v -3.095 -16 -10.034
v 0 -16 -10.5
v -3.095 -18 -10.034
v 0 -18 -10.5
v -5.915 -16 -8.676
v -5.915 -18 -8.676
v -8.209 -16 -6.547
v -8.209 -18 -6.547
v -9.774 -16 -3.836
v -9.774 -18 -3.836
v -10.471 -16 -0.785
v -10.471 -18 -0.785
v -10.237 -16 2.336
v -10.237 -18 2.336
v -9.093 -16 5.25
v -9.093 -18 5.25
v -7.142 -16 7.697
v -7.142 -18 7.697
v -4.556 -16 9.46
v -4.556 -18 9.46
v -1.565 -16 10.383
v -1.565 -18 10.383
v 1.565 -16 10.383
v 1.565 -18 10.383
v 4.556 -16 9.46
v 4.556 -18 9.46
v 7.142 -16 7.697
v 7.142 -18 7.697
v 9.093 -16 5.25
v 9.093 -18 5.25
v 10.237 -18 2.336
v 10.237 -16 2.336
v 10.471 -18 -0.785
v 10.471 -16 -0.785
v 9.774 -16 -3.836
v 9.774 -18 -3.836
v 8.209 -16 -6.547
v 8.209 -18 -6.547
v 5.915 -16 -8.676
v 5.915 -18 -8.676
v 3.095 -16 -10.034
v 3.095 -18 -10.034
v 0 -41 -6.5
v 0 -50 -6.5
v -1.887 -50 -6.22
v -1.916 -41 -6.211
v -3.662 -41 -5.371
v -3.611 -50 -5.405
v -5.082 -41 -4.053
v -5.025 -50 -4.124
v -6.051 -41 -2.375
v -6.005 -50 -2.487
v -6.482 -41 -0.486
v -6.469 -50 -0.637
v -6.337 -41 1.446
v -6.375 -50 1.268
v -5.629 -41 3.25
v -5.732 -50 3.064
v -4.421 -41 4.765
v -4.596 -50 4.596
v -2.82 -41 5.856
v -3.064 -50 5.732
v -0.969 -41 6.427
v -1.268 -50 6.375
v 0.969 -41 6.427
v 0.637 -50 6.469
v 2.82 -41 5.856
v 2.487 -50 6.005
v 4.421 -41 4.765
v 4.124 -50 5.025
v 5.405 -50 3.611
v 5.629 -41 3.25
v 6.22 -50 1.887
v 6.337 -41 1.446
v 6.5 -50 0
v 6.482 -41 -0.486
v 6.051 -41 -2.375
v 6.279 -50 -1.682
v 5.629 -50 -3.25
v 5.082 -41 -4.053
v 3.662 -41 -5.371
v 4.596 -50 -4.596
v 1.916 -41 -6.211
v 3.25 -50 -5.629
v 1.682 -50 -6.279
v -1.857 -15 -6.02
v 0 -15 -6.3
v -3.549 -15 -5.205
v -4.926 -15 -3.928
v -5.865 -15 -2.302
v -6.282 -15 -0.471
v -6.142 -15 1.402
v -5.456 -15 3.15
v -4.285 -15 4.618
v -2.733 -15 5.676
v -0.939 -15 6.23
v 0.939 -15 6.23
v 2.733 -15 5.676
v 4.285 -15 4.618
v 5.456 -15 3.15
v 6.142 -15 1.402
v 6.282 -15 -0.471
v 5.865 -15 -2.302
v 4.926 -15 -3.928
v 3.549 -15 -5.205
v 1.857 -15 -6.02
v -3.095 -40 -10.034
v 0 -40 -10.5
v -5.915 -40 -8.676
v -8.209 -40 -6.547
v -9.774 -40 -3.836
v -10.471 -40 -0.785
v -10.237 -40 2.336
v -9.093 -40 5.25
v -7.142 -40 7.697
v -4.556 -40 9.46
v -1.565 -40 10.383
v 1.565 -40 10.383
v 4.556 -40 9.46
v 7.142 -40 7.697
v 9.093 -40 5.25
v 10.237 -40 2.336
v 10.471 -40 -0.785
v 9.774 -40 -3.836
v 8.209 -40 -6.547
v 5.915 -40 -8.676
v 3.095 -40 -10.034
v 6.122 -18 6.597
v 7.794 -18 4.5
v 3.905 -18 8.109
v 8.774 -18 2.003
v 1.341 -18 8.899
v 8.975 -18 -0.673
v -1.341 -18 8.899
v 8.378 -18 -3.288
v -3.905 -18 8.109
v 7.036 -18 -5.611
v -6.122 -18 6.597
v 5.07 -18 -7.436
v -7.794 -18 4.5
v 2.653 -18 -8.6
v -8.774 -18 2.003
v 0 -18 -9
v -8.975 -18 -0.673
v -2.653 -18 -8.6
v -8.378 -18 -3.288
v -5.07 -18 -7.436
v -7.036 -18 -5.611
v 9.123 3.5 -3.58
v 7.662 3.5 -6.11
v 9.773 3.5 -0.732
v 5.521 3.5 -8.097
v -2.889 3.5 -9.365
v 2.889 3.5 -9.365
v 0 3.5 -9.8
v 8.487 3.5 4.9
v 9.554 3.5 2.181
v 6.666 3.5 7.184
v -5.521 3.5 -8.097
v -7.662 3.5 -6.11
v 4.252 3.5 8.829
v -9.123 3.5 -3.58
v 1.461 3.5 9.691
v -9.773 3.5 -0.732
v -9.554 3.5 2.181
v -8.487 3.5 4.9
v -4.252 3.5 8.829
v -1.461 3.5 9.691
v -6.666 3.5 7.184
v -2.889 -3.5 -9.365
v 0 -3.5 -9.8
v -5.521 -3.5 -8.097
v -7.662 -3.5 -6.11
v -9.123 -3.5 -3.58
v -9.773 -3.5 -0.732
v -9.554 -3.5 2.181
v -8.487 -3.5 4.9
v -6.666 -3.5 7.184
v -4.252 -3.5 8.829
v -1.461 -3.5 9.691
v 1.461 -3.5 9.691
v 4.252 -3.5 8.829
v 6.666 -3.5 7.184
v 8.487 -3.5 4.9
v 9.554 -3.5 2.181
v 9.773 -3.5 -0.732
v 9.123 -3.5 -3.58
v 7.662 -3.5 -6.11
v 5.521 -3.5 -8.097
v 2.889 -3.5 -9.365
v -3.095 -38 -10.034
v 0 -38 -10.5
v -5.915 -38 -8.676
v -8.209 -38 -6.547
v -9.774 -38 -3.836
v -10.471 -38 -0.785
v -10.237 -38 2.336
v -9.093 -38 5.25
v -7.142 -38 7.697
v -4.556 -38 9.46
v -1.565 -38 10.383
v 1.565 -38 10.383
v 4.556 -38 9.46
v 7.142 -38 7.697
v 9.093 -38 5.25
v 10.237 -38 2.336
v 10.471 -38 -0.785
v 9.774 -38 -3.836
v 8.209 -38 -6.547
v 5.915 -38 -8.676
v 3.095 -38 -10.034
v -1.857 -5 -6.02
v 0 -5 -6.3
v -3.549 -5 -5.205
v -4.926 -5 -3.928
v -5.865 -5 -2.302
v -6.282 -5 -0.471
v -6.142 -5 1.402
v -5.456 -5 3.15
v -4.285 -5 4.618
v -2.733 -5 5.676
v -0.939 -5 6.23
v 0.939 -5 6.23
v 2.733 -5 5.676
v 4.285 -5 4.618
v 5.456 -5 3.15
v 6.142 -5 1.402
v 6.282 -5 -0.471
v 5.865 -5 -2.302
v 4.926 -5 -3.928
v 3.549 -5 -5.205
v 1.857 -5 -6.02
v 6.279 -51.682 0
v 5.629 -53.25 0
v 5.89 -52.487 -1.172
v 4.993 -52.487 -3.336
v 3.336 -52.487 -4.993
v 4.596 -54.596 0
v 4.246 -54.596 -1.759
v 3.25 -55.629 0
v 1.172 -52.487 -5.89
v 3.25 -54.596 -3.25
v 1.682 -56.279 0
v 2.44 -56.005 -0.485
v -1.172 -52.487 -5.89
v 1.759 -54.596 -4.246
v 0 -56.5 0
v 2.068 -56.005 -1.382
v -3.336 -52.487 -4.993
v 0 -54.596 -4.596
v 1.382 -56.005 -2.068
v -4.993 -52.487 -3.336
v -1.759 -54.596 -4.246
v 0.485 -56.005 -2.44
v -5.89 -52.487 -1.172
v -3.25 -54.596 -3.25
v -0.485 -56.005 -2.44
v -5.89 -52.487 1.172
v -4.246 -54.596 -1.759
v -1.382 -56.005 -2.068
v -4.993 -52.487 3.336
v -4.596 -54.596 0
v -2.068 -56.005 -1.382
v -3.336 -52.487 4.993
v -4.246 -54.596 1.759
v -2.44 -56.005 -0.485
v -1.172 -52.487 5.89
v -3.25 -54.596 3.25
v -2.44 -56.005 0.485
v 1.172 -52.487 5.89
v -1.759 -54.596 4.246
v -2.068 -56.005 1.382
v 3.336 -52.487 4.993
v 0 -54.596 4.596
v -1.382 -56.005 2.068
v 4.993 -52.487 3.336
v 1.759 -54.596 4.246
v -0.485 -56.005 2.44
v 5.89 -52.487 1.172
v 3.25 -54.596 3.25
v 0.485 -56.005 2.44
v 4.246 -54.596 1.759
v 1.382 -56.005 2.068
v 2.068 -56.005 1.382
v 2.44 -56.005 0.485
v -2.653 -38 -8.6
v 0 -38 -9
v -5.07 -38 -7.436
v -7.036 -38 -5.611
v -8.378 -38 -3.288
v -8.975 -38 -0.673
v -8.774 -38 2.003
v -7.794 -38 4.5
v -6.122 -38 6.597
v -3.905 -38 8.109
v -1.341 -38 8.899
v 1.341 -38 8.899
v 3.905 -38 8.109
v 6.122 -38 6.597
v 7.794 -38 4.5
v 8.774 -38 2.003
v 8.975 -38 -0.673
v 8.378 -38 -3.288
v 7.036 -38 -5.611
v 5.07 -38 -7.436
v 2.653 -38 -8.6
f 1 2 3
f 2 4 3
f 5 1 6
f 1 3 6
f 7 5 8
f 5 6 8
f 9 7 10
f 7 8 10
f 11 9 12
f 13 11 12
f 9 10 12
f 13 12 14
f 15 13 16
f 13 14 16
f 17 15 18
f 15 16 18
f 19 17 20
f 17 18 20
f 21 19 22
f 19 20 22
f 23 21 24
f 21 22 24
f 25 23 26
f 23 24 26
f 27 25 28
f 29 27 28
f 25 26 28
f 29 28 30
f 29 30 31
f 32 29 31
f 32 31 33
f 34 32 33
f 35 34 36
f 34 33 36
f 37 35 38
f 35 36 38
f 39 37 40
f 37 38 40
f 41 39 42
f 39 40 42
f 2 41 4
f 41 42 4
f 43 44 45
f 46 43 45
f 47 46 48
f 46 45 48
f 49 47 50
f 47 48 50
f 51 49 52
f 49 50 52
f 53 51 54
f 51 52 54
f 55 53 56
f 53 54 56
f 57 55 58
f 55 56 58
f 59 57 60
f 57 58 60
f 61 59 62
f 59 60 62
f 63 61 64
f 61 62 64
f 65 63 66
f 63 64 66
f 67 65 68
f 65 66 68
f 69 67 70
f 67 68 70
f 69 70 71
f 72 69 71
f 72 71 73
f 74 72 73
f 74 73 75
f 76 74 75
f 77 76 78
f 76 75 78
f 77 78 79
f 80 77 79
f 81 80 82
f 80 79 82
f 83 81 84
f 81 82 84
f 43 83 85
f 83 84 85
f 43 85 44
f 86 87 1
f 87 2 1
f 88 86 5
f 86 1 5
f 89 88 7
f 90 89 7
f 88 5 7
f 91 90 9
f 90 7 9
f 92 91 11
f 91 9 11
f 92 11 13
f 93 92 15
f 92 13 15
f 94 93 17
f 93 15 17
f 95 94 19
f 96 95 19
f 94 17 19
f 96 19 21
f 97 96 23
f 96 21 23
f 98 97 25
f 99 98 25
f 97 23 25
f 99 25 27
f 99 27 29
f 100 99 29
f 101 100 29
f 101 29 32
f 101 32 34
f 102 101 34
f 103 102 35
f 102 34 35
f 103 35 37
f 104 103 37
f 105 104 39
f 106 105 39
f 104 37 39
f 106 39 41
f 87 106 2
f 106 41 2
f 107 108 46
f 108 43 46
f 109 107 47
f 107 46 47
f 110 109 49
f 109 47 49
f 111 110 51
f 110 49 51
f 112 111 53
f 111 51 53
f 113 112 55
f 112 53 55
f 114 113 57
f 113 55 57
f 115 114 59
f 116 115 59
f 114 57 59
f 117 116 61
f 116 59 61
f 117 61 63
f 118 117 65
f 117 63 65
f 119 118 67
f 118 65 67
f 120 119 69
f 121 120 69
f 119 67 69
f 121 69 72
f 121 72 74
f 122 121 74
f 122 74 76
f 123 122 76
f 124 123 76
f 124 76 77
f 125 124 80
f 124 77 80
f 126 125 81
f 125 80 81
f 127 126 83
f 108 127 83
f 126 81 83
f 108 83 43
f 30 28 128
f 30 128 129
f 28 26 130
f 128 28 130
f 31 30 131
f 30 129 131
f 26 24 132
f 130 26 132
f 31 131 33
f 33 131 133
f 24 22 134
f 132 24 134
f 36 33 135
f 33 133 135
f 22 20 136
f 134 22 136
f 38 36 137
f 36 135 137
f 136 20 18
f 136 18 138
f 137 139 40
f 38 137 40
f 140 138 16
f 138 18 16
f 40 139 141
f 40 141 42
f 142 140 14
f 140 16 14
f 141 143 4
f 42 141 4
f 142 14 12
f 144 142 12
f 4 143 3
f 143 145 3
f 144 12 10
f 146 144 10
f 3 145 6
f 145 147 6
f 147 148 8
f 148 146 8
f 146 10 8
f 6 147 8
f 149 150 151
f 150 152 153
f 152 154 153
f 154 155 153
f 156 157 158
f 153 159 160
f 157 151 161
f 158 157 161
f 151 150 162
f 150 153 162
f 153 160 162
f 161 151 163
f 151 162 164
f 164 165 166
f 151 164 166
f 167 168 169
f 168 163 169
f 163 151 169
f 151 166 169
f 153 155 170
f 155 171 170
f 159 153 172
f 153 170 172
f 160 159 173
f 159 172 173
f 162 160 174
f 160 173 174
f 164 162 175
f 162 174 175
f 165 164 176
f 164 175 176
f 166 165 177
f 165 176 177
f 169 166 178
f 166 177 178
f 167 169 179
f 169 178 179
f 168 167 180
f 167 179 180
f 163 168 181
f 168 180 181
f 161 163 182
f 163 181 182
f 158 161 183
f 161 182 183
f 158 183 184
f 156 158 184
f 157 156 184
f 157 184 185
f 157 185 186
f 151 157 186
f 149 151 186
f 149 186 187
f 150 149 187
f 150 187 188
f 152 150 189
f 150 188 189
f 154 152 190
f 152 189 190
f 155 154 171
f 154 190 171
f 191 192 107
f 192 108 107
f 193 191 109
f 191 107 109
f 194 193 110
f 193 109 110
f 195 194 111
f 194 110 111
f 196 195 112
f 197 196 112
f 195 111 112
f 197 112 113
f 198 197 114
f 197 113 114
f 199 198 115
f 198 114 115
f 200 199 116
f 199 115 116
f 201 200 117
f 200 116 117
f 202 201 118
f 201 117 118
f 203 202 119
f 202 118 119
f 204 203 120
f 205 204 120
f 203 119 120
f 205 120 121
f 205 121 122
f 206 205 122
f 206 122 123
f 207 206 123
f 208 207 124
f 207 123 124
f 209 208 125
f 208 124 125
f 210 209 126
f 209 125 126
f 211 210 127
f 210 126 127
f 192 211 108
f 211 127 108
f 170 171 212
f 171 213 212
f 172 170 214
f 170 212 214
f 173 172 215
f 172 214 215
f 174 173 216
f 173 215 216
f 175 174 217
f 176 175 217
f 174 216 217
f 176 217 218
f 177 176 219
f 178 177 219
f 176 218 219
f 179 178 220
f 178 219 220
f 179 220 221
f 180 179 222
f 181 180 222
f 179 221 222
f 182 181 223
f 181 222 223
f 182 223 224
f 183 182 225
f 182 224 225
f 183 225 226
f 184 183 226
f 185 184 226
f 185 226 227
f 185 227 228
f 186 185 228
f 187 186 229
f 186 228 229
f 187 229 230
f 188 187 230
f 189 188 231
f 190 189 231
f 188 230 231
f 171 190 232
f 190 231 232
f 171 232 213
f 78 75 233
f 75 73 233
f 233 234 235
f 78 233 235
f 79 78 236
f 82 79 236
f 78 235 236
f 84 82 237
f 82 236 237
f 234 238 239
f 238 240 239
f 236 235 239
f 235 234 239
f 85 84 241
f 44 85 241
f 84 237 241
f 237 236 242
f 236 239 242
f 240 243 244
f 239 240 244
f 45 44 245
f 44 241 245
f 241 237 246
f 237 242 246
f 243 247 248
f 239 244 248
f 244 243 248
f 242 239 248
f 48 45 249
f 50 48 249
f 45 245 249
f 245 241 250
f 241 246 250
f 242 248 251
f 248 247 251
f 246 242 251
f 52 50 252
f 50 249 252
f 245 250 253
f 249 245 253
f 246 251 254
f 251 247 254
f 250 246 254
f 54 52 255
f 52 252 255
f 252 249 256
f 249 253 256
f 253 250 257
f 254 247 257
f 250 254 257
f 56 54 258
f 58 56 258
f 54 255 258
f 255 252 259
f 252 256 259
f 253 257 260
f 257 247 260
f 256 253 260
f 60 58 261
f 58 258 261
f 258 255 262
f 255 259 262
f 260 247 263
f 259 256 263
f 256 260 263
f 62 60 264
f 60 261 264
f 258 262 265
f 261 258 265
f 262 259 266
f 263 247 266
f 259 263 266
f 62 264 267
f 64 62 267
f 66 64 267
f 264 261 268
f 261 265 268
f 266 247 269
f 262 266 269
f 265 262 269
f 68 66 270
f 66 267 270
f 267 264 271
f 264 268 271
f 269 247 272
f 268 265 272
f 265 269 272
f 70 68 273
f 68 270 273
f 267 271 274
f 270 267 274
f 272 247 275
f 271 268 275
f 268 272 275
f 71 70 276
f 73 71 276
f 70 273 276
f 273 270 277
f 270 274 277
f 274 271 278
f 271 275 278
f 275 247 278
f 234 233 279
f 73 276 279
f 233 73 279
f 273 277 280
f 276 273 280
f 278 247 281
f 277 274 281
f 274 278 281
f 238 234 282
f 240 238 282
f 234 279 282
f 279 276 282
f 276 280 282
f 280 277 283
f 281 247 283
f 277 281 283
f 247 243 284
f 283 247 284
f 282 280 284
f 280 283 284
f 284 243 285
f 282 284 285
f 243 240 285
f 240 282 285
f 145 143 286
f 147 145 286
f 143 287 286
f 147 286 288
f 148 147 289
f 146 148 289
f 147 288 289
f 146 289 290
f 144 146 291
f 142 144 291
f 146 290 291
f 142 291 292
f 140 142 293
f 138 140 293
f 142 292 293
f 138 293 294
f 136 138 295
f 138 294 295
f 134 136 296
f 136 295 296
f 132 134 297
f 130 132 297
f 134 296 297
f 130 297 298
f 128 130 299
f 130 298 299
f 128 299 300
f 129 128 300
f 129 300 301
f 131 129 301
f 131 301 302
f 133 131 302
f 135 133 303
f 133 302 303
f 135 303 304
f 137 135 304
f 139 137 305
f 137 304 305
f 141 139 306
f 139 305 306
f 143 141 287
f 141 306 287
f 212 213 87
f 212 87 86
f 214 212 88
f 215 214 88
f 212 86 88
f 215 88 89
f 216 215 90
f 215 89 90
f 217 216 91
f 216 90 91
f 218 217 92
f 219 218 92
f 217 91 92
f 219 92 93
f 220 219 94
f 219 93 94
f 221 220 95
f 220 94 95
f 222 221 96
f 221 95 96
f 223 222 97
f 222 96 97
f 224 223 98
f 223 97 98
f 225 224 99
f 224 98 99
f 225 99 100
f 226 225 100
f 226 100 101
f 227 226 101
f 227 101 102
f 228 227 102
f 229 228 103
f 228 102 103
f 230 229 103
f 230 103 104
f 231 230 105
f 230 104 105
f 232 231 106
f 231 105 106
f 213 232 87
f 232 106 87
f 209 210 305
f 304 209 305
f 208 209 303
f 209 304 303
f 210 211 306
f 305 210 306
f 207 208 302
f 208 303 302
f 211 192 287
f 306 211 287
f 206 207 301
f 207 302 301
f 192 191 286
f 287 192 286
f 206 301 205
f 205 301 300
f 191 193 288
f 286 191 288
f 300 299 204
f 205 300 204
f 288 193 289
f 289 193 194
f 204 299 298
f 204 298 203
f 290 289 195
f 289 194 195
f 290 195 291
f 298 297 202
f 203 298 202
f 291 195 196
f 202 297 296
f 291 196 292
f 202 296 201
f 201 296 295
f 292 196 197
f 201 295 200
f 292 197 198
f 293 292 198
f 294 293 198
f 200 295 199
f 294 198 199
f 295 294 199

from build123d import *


with BuildPart() as part:
    # Sketch1 → Cabeza_cuello_tambor (revolve)
    with BuildSketch(Plane.XY, mode=Mode.PRIVATE) as cabeza_cuello_tambor_sk:
        Polygon((0, 3.5), (9.8, 3.5), (9.8, -3.5), (6.3, -5), (6.3, -15), (10.5, -16), (10.5, -18), (9, -18), (9, -38), (10.5, -38), (10.5, -40), (6.5, -41), (6.5, -50), (0, -50), align=None)
    revolve(cabeza_cuello_tambor_sk.sketch.rotate(Axis((0, -54, 0), (0, 1, 0)), 90), axis=Axis((0, -54, 0), (0, 1, 0)))

    # Sketch2 → Union_diafisis (revolve)
    with BuildSketch(Plane.XY):
        with BuildLine():
            Line((0, -56.5), (0, -43.5))
            ThreePointArc((0, -43.5), (6.5, -50), (0, -56.5))
        make_face()
    revolve(axis=Axis((0, -60.5, 0), (0, 1, 0)))


solid = part.part
